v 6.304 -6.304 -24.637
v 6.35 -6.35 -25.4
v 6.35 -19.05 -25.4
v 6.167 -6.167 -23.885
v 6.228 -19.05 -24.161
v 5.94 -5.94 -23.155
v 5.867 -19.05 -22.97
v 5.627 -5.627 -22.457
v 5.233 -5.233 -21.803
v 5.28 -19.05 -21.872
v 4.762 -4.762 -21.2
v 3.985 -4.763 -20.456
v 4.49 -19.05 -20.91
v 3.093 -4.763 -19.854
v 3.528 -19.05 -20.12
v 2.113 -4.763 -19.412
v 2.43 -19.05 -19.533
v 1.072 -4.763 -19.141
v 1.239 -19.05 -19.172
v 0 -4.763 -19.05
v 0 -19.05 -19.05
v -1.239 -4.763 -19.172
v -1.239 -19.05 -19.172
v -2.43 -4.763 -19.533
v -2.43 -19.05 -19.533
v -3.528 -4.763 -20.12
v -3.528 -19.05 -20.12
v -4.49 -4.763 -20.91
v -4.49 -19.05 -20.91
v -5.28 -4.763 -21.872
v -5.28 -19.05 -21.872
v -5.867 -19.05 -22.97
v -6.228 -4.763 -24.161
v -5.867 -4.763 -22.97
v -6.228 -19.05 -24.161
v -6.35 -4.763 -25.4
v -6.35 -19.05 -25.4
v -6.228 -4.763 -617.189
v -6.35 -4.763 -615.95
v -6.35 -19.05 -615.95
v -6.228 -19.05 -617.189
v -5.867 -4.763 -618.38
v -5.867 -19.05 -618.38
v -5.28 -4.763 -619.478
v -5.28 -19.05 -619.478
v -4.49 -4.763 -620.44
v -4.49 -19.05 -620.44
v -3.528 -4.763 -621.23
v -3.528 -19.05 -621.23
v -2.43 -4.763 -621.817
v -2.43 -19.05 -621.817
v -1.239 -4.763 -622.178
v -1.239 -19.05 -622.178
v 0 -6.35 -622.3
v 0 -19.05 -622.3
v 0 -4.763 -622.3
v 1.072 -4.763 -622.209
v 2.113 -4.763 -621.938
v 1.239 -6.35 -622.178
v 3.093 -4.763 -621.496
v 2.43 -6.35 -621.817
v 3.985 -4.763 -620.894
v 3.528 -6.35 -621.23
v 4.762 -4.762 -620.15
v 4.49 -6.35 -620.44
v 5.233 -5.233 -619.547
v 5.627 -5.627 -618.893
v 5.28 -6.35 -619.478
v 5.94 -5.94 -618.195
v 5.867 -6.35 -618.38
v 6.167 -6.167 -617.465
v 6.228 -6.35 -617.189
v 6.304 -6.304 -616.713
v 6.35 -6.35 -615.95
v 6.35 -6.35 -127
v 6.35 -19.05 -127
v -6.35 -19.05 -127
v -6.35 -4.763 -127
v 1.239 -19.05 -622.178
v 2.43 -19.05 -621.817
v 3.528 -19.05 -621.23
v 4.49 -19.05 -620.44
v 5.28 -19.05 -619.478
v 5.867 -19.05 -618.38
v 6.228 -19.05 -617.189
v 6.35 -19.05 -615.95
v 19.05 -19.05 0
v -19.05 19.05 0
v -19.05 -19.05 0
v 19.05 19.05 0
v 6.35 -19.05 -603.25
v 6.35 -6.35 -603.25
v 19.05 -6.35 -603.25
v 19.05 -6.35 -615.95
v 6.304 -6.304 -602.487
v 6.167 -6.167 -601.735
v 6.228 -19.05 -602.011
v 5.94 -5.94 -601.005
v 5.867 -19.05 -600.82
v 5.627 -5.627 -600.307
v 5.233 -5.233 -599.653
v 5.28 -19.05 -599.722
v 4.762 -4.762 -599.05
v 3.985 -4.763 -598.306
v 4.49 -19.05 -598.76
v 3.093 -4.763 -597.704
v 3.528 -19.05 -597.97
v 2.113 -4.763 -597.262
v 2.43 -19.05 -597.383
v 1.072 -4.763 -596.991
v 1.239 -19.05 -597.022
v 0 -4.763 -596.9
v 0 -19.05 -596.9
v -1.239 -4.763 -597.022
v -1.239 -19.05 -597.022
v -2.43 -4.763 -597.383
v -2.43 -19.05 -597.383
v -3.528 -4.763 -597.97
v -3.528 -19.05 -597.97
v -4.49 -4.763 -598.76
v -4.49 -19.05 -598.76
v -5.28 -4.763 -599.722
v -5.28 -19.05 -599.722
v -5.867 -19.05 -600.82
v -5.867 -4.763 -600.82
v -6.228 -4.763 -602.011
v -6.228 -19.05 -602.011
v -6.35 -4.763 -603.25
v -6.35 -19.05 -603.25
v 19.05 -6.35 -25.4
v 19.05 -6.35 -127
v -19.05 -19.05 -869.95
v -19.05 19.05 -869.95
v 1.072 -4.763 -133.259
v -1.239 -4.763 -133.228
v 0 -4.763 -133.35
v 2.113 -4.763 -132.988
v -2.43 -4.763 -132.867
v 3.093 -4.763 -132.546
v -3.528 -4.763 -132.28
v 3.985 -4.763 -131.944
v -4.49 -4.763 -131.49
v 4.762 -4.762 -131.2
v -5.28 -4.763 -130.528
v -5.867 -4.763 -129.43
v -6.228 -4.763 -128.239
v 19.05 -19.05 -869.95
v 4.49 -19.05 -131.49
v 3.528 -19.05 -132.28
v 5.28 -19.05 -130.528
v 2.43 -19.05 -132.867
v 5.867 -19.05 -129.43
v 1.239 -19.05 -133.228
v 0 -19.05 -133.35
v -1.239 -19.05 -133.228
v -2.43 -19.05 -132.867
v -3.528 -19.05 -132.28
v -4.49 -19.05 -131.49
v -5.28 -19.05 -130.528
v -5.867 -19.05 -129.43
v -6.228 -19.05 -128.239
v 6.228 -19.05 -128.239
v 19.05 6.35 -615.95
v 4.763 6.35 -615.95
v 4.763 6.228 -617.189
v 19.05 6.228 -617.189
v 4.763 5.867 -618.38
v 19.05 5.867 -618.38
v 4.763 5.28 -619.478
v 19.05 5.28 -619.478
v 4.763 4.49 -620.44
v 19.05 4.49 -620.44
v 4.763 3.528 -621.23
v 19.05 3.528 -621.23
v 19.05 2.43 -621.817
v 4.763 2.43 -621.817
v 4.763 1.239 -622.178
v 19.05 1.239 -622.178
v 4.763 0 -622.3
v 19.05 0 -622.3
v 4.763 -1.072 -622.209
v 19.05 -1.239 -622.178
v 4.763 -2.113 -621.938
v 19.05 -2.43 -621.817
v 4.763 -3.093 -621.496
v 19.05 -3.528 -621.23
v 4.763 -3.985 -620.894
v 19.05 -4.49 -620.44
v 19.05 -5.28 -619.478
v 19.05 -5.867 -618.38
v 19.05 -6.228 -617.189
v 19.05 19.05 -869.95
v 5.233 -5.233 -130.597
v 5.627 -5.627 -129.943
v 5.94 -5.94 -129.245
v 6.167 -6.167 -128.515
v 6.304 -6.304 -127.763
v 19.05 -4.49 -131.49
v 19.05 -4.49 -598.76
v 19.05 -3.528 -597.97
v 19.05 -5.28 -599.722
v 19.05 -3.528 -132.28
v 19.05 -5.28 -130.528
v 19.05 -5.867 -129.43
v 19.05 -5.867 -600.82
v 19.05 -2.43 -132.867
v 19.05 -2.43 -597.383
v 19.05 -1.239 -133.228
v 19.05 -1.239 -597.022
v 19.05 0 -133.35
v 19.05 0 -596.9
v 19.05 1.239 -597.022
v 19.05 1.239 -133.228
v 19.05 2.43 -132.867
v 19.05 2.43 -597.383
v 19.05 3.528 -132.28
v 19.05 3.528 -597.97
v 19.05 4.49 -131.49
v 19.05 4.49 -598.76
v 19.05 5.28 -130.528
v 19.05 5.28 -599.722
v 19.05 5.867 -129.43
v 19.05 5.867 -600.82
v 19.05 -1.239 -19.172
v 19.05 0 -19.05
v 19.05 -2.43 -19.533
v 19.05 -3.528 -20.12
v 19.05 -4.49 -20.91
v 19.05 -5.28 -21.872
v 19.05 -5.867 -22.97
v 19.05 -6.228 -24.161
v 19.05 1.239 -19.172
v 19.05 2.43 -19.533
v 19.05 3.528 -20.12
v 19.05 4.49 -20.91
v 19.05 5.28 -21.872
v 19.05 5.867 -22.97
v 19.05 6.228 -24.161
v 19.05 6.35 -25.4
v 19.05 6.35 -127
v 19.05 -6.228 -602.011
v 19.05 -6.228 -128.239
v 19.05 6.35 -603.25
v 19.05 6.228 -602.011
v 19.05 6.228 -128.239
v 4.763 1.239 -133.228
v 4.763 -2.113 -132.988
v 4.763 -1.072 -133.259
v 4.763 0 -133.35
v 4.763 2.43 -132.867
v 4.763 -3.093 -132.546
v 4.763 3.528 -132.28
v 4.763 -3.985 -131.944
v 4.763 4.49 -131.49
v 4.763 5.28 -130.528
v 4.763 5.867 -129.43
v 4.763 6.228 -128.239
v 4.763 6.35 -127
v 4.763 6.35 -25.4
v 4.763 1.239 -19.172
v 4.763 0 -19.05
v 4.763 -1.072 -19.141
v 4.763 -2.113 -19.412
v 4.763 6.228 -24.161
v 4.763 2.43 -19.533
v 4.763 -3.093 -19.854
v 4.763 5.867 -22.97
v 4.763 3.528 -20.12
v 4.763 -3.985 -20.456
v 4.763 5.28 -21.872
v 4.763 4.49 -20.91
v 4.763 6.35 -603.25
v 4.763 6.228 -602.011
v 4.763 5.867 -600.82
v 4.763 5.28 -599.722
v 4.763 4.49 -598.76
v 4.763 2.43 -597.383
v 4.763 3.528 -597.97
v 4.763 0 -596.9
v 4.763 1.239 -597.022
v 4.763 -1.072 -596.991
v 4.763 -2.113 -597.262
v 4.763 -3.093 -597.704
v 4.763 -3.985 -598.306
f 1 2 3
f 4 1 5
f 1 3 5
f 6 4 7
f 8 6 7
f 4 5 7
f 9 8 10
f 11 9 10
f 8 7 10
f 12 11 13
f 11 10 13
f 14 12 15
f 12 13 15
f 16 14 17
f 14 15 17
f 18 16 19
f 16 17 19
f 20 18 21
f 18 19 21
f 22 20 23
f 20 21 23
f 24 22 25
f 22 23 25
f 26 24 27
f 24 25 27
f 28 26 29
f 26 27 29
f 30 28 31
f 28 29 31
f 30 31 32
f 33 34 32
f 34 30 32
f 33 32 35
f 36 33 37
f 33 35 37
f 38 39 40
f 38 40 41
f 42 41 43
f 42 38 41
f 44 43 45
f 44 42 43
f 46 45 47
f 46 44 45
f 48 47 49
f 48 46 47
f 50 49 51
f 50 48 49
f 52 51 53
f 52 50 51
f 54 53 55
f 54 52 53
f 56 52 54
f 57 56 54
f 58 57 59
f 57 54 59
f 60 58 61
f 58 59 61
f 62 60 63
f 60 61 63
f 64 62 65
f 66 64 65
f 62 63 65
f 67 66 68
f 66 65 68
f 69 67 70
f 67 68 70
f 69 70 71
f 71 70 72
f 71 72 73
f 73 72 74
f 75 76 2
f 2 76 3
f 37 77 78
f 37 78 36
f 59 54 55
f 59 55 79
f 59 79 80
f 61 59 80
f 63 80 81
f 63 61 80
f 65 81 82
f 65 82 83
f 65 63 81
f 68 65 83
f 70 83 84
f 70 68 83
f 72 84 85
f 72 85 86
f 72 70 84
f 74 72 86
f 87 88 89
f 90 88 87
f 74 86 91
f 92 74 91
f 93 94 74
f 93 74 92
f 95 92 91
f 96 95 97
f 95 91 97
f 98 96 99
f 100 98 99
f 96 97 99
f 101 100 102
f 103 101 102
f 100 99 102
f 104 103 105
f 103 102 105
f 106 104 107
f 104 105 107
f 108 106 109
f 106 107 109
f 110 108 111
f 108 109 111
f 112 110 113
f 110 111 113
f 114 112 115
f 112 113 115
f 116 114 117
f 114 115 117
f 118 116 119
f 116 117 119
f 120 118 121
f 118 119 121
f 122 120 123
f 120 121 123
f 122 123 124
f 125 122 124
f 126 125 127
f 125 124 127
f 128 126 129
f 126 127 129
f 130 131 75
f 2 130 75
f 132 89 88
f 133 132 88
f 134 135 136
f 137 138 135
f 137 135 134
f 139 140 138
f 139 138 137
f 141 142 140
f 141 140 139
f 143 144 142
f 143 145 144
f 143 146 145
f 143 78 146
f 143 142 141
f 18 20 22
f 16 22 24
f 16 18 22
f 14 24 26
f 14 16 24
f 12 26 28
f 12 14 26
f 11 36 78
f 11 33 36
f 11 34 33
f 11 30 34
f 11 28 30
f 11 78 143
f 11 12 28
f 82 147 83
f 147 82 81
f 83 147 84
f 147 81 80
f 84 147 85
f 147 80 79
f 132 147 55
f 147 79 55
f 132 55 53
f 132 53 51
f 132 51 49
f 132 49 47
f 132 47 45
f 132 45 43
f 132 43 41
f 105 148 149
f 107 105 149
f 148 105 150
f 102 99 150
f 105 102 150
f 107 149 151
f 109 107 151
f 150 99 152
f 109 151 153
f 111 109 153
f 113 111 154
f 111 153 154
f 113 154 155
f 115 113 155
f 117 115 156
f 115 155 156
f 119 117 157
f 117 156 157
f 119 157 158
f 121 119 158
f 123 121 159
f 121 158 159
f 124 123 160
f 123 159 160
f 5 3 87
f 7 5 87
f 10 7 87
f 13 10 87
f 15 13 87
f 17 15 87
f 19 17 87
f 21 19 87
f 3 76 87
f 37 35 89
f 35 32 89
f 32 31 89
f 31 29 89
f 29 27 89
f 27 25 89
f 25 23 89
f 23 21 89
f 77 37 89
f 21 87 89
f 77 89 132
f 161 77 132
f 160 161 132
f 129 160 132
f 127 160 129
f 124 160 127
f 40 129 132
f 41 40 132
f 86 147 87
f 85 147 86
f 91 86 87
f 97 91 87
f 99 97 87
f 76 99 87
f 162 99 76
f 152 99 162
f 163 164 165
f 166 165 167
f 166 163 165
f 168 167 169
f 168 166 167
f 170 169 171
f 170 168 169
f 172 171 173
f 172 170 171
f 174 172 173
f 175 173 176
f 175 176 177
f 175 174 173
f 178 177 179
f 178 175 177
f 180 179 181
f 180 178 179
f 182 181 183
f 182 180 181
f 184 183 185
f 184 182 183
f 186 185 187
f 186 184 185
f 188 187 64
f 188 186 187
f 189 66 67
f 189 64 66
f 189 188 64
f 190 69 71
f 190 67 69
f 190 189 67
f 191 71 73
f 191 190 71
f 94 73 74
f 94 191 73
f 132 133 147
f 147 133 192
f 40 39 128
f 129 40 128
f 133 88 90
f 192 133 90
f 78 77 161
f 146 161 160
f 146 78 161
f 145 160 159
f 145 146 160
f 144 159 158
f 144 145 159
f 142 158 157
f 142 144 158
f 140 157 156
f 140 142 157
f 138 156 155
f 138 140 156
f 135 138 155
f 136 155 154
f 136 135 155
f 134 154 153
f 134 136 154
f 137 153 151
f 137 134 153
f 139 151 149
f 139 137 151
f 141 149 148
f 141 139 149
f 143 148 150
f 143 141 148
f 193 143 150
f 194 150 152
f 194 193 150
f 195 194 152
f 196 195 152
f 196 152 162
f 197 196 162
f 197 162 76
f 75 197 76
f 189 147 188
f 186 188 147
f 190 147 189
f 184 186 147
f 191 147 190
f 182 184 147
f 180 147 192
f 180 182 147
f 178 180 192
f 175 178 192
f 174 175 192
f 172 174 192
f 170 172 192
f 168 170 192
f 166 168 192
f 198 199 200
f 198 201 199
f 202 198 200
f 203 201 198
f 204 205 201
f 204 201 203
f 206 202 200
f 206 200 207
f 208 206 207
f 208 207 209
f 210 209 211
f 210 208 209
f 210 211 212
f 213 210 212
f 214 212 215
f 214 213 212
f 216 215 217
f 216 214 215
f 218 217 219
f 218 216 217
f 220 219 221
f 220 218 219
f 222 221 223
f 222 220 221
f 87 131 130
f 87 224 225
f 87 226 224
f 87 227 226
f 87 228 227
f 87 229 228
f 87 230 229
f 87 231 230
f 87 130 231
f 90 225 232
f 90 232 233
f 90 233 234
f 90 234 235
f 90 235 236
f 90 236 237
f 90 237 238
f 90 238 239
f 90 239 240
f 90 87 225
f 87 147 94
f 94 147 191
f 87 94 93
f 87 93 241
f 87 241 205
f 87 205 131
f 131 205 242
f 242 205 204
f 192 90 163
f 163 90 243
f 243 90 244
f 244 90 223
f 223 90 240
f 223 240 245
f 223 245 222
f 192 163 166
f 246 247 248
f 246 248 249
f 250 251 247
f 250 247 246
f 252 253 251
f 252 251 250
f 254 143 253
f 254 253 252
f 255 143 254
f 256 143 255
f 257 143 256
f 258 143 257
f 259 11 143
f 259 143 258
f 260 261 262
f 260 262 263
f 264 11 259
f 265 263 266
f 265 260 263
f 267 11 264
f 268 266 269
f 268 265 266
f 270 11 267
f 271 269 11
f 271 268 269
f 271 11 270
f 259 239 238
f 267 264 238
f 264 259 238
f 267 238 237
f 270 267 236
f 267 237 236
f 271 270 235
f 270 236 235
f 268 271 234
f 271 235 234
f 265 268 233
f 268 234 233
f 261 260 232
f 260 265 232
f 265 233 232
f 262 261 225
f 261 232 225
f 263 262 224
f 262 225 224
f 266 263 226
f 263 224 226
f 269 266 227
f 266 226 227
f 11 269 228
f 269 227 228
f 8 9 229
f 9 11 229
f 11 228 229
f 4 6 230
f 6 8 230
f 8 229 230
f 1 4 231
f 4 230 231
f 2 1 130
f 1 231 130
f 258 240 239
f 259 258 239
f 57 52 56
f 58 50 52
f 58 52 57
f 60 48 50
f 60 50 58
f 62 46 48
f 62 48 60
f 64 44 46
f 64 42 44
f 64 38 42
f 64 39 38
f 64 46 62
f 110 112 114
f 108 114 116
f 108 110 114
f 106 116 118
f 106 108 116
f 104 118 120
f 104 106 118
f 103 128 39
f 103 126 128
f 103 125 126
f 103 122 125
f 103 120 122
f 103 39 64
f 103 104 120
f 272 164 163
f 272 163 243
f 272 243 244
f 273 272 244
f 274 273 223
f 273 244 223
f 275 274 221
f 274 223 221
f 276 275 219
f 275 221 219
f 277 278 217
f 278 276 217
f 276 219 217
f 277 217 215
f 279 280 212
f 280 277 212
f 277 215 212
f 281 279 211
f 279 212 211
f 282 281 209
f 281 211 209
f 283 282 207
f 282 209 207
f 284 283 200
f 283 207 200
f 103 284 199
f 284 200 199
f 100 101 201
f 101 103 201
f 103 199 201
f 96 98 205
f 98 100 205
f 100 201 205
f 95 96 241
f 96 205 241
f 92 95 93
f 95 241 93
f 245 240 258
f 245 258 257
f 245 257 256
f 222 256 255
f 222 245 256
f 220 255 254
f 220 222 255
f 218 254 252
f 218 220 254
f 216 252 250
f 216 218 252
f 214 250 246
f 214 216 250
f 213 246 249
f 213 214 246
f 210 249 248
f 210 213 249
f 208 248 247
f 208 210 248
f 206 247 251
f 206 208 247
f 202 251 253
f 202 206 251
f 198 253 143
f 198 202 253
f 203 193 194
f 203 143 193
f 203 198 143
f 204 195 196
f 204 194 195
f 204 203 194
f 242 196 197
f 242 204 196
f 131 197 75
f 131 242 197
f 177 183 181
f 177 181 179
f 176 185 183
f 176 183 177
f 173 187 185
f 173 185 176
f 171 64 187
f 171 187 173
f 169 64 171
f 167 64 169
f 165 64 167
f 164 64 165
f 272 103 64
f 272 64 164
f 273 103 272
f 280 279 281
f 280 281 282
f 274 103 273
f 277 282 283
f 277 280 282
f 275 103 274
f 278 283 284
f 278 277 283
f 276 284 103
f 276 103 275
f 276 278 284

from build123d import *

# Parameters (mm, degrees)
F0_W         = 38.1
F0_H         = 38.1
F1_DEPTH     = 869.95
F2_W         = 12.7
F2_H         = 114.3
F2_H_2       = 25.4
F3_DEPTH     = 14.2875
F4_W         = 12.7
F4_H         = 114.3
F4_H_2       = 25.4
F5_DEPTH     = 14.2875
F6_T1_DEPTH  = 30.1625
F6_T3_DEPTH  = 12.7
F6_T5_DEPTH  = 30.1625
F6_T7_DEPTH  = 12.7
F6_T13_DEPTH = 28.575
F6_T17_DEPTH = 28.575
F6_T24_DEPTH = 28.575
F6_T28_DEPTH = 28.575
F6_T35_DEPTH = 28.575
F6_T39_DEPTH = 28.575
F6_T46_DEPTH = 28.575
F6_T50_DEPTH = 28.575


# Not quite as in the source:
# - a fillet or chamfer that OpenCascade refuses, or shapes differently, is made with other operations: its cross-section is extruded or revolved along the edge and cut away or added


with BuildPart() as f1:
    # F0 (on Top) → F1 (new body)
    with BuildSketch(Plane.XY):
        Rectangle(F0_W, F0_H)
    extrude(amount=-F1_DEPTH)

    # F2 (on face) → F3 (cut)
    with BuildSketch(Plane.XZ.offset(19.05)):
        with Locations((0, -76.2)):
            Rectangle(F2_W, F2_H)
        with Locations((0, -609.6)):
            Rectangle(F2_W, F2_H_2)
    extrude(amount=-F3_DEPTH, mode=Mode.SUBTRACT)

    # F4 (on face) → F5 (cut)
    with BuildSketch(Plane.YZ.offset(19.05)):
        with Locations((0, -76.2)):
            Rectangle(F4_W, F4_H)
        with Locations((0, -609.6)):
            Rectangle(F4_W, F4_H_2)
    extrude(amount=-F5_DEPTH, mode=Mode.SUBTRACT)

    # F6: fillet of radius 6.35 on 16 edges, made by hand

    # F6_s2 → F6_t1 (join)
    with BuildSketch(Plane.XZ.offset(-11.1125)):
        with BuildLine():
            ThreePointArc((-6.35, -25.4), (-4.4901280605, -20.9098719395), (0, -19.05))
            Line((0, -19.05), (-6.35, -19.05))
            Line((-6.35, -19.05), (-6.35, -25.4))
        make_face()
        with BuildLine():
            ThreePointArc((-6.35, -127), (-4.4901280605, -131.4901280605), (0, -133.35))
            Line((0, -133.35), (-6.35, -133.35))
            Line((-6.35, -133.35), (-6.35, -127))
        make_face()
        with BuildLine():
            ThreePointArc((-6.35, -603.25), (-4.4901280605, -598.7598719395), (0, -596.9))
            Line((0, -596.9), (-6.35, -596.9))
            Line((-6.35, -596.9), (-6.35, -603.25))
        make_face()
        with BuildLine():
            ThreePointArc((-6.35, -615.95), (-4.4901280605, -620.4401280605), (0, -622.3))
            Line((0, -622.3), (-6.35, -622.3))
            Line((-6.35, -622.3), (-6.35, -615.95))
        make_face()
    extrude(amount=F6_T1_DEPTH)

    # F6_s4 → F6_t3 (join)
    with BuildSketch(Plane.XZ.offset(6.35)):
        with BuildLine():
            ThreePointArc((6.35, -25.4), (4.4901280605, -20.9098719395), (0, -19.05))
            Line((0, -19.05), (6.35, -19.05))
            Line((6.35, -19.05), (6.35, -25.4))
        make_face()
        with BuildLine():
            ThreePointArc((0, -133.35), (4.4901280605, -131.4901280605), (6.35, -127))
            Line((6.35, -127), (6.35, -133.35))
            Line((6.35, -133.35), (0, -133.35))
        make_face()
        with BuildLine():
            ThreePointArc((6.35, -603.25), (4.4901280605, -598.7598719395), (0, -596.9))
            Line((0, -596.9), (6.35, -596.9))
            Line((6.35, -596.9), (6.35, -603.25))
        make_face()
        with BuildLine():
            ThreePointArc((0, -622.3), (4.4901280605, -620.4401280605), (6.35, -615.95))
            Line((6.35, -615.95), (6.35, -622.3))
            Line((6.35, -622.3), (0, -622.3))
        make_face()
    extrude(amount=F6_T3_DEPTH)

    # F6_s6 → F6_t5 (join)
    with BuildSketch(Plane.YZ.offset(-11.1125)):
        with BuildLine():
            ThreePointArc((0, -133.35), (4.4901280605, -131.4901280605), (6.35, -127))
            Line((6.35, -127), (6.35, -133.35))
            Line((6.35, -133.35), (0, -133.35))
        make_face()
        with BuildLine():
            ThreePointArc((0, -19.05), (4.4901280605, -20.9098719395), (6.35, -25.4))
            Line((6.35, -25.4), (6.35, -19.05))
            Line((6.35, -19.05), (0, -19.05))
        make_face()
        with BuildLine():
            ThreePointArc((0, -596.9), (4.4901280605, -598.7598719395), (6.35, -603.25))
            Line((6.35, -603.25), (6.35, -596.9))
            Line((6.35, -596.9), (0, -596.9))
        make_face()
        with BuildLine():
            ThreePointArc((0, -622.3), (4.4901280605, -620.4401280605), (6.35, -615.95))
            Line((6.35, -615.95), (6.35, -622.3))
            Line((6.35, -622.3), (0, -622.3))
        make_face()
    extrude(amount=F6_T5_DEPTH)

    # F6_s8 → F6_t7 (join)
    with BuildSketch(Plane.YZ.offset(6.35)):
        with BuildLine():
            ThreePointArc((0, -133.35), (-4.4901280605, -131.4901280605), (-6.35, -127))
            Line((-6.35, -127), (-6.35, -133.35))
            Line((-6.35, -133.35), (0, -133.35))
        make_face()
        with BuildLine():
            ThreePointArc((0, -19.05), (-4.4901280605, -20.9098719395), (-6.35, -25.4))
            Line((-6.35, -25.4), (-6.35, -19.05))
            Line((-6.35, -19.05), (0, -19.05))
        make_face()
        with BuildLine():
            ThreePointArc((0, -596.9), (-4.4901280605, -598.7598719395), (-6.35, -603.25))
            Line((-6.35, -603.25), (-6.35, -596.9))
            Line((-6.35, -596.9), (0, -596.9))
        make_face()
        with BuildLine():
            ThreePointArc((0, -622.3), (-4.4901280605, -620.4401280605), (-6.35, -615.95))
            Line((-6.35, -615.95), (-6.35, -622.3))
            Line((-6.35, -622.3), (0, -622.3))
        make_face()
    extrude(amount=F6_T7_DEPTH)


with BuildPart() as f6_tool11:
    # F6_s12 → F6_t13 (new body)
    with BuildSketch(Plane.XZ.offset(19.05)):
        with BuildLine():
            ThreePointArc((6.35, -25.4), (4.4901280605, -20.9098719395), (0, -19.05))
            Line((0, -19.05), (6.35, -19.05))
            Line((6.35, -19.05), (6.35, -25.4))
        make_face()
    extrude(amount=-F6_T13_DEPTH)

    split(bisect_by=Plane.XZ.offset(6.35), keep=Keep.BOTTOM)


with BuildPart() as f6_tool15:
    # F6_s16 → F6_t17 (new body)
    with BuildSketch(Plane.YZ.offset(19.05)):
        with BuildLine():
            ThreePointArc((0, -19.05), (-4.4901280605, -20.9098719395), (-6.35, -25.4))
            Line((-6.35, -25.4), (-6.35, -19.05))
            Line((-6.35, -19.05), (0, -19.05))
        make_face()
    extrude(amount=-F6_T17_DEPTH)

    split(bisect_by=Plane.YZ.offset(6.35), keep=Keep.BOTTOM)


with BuildPart() as f6_tool11_1:
    add(f6_tool11.part)

    # F6_t19: intersect F6_tool15
    add(f6_tool15.part, mode=Mode.INTERSECT)


with BuildPart() as f1_1:
    add(f1.part)

    # F6_t9: union F6_tool11
    add(f6_tool11_1.part)


with BuildPart() as f6_tool22:
    # F6_s23 → F6_t24 (new body)
    with BuildSketch(Plane.YZ.offset(19.05)):
        with BuildLine():
            ThreePointArc((0, -133.35), (-4.4901280605, -131.4901280605), (-6.35, -127))
            Line((-6.35, -127), (-6.35, -133.35))
            Line((-6.35, -133.35), (0, -133.35))
        make_face()
    extrude(amount=-F6_T24_DEPTH)

    split(bisect_by=Plane.YZ.offset(6.35), keep=Keep.BOTTOM)


with BuildPart() as f6_tool26:
    # F6_s27 → F6_t28 (new body)
    with BuildSketch(Plane.XZ.offset(19.05)):
        with BuildLine():
            ThreePointArc((0, -133.35), (4.4901280605, -131.4901280605), (6.35, -127))
            Line((6.35, -127), (6.35, -133.35))
            Line((6.35, -133.35), (0, -133.35))
        make_face()
    extrude(amount=-F6_T28_DEPTH)

    split(bisect_by=Plane.XZ.offset(6.35), keep=Keep.BOTTOM)


with BuildPart() as f6_tool22_1:
    add(f6_tool22.part)

    # F6_t30: intersect F6_tool26
    add(f6_tool26.part, mode=Mode.INTERSECT)


with BuildPart() as f1_2:
    add(f1_1.part)

    # F6_t20: union F6_tool22
    add(f6_tool22_1.part)


with BuildPart() as f6_tool33:
    # F6_s34 → F6_t35 (new body)
    with BuildSketch(Plane.XZ.offset(19.05)):
        with BuildLine():
            ThreePointArc((6.35, -603.25), (4.4901280605, -598.7598719395), (0, -596.9))
            Line((0, -596.9), (6.35, -596.9))
            Line((6.35, -596.9), (6.35, -603.25))
        make_face()
    extrude(amount=-F6_T35_DEPTH)

    split(bisect_by=Plane.XZ.offset(6.35), keep=Keep.BOTTOM)


with BuildPart() as f6_tool37:
    # F6_s38 → F6_t39 (new body)
    with BuildSketch(Plane.YZ.offset(19.05)):
        with BuildLine():
            ThreePointArc((0, -596.9), (-4.4901280605, -598.7598719395), (-6.35, -603.25))
            Line((-6.35, -603.25), (-6.35, -596.9))
            Line((-6.35, -596.9), (0, -596.9))
        make_face()
    extrude(amount=-F6_T39_DEPTH)

    split(bisect_by=Plane.YZ.offset(6.35), keep=Keep.BOTTOM)


with BuildPart() as f6_tool33_1:
    add(f6_tool33.part)

    # F6_t41: intersect F6_tool37
    add(f6_tool37.part, mode=Mode.INTERSECT)


with BuildPart() as f1_3:
    add(f1_2.part)

    # F6_t31: union F6_tool33
    add(f6_tool33_1.part)


with BuildPart() as f6_tool44:
    # F6_s45 → F6_t46 (new body)
    with BuildSketch(Plane.YZ.offset(19.05)):
        with BuildLine():
            ThreePointArc((0, -622.3), (-4.4901280605, -620.4401280605), (-6.35, -615.95))
            Line((-6.35, -615.95), (-6.35, -622.3))
            Line((-6.35, -622.3), (0, -622.3))
        make_face()
    extrude(amount=-F6_T46_DEPTH)

    split(bisect_by=Plane.YZ.offset(6.35), keep=Keep.BOTTOM)


with BuildPart() as f6_tool48:
    # F6_s49 → F6_t50 (new body)
    with BuildSketch(Plane.XZ.offset(19.05)):
        with BuildLine():
            ThreePointArc((0, -622.3), (4.4901280605, -620.4401280605), (6.35, -615.95))
            Line((6.35, -615.95), (6.35, -622.3))
            Line((6.35, -622.3), (0, -622.3))
        make_face()
    extrude(amount=-F6_T50_DEPTH)

    split(bisect_by=Plane.XZ.offset(6.35), keep=Keep.BOTTOM)


with BuildPart() as f6_tool44_1:
    add(f6_tool44.part)

    # F6_t52: intersect F6_tool48
    add(f6_tool48.part, mode=Mode.INTERSECT)


with BuildPart() as f1_4:
    add(f1_3.part)

    # F6_t42: union F6_tool44
    add(f6_tool44_1.part)


solid = f1_4.part
